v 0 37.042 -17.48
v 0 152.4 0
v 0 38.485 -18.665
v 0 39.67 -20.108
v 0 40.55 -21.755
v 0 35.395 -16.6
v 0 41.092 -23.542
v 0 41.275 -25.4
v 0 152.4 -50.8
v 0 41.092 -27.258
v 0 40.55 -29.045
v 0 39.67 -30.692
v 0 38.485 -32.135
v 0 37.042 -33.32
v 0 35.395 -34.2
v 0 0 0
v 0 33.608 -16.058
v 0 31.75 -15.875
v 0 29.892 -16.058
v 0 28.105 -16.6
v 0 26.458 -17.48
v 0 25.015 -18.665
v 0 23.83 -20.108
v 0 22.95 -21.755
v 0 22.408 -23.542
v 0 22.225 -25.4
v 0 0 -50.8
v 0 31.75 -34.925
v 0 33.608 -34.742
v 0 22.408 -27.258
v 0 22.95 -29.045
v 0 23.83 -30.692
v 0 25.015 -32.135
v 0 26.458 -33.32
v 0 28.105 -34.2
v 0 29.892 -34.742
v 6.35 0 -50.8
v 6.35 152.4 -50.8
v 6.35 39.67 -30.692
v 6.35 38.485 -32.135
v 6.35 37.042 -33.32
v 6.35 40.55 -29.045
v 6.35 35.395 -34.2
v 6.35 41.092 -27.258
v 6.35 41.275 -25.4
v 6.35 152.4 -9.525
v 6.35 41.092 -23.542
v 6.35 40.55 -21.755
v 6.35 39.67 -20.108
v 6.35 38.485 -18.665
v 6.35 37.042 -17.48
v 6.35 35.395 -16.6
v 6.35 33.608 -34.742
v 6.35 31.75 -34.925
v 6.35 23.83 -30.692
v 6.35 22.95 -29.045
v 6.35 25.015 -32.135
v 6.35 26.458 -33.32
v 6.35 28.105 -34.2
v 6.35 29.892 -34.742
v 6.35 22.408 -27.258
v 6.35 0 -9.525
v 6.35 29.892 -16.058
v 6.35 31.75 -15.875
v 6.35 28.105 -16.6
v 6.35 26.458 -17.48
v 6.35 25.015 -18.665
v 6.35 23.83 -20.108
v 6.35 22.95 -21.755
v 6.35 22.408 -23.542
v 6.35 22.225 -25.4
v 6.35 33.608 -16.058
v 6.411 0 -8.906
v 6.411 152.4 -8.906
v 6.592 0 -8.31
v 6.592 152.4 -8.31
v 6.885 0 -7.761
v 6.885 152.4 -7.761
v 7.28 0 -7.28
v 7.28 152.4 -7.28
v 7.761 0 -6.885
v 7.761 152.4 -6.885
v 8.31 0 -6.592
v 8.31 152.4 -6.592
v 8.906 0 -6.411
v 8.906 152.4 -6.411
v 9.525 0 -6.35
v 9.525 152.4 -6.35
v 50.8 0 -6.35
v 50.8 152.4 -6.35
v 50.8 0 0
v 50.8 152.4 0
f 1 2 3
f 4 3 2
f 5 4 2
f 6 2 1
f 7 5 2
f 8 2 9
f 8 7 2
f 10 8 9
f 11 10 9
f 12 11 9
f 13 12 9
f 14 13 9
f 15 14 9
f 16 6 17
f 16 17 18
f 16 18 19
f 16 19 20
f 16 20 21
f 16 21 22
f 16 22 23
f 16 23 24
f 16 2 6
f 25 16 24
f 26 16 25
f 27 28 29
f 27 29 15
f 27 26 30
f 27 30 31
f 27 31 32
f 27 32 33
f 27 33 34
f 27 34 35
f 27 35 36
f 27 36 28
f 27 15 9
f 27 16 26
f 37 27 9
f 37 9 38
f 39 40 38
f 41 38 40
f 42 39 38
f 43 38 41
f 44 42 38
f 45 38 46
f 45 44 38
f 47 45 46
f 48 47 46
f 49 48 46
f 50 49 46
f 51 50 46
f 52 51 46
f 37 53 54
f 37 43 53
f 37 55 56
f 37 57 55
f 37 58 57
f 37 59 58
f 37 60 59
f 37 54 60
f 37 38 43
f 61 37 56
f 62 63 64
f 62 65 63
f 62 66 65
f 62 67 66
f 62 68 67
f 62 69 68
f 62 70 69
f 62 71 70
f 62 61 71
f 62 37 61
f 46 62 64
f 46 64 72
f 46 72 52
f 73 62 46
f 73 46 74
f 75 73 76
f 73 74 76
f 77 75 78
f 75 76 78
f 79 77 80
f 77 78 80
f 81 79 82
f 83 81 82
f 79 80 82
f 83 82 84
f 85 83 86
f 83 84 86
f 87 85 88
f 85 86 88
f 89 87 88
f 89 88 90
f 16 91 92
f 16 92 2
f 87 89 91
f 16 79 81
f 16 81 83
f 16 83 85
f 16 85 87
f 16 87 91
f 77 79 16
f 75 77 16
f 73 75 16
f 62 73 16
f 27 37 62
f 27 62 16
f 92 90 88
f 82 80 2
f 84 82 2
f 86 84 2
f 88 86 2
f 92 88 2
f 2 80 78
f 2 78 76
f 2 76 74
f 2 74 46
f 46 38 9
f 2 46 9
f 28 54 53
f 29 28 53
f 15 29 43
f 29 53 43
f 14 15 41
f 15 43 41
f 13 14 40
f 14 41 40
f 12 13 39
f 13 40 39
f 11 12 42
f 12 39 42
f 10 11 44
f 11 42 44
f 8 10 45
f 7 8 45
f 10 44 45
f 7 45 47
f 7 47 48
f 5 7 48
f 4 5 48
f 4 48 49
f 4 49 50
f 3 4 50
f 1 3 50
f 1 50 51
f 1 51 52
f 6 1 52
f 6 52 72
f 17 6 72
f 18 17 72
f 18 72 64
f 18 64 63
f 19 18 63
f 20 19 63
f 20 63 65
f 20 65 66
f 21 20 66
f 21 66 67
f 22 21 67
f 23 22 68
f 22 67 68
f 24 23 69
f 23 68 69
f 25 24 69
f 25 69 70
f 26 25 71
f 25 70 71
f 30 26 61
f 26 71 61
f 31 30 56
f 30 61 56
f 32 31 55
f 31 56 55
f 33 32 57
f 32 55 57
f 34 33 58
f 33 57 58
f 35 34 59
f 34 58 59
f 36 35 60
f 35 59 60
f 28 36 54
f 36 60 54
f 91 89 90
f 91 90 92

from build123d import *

# Parameters (mm, degrees)
BOSS_EXTRUDE1_DEPTH             = 152.4
FILLET1_R                       = 3.175
F_3_4_0_75_DIAMETER_HOLE1_D     = 19.05
F_3_4_0_75_DIAMETER_HOLE1_DEPTH = 6.35


with BuildPart() as part:
    # Sketch1 → Boss-Extrude1 (new body)
    with BuildSketch(Plane(origin=(0, 0, 0), x_dir=(1, 0, 0), z_dir=(0, 1, 0))):
        Polygon((0, 0), (0, 50.8), (6.35, 50.8), (6.35, 6.35), (50.8, 6.35), (50.8, 0), align=None)
    extrude(amount=BOSS_EXTRUDE1_DEPTH)

    # Fillet1
    fillet1_edges = [part.edges().sort_by_distance(p)[0] for p in [
        (6.35, 76.2, -6.35),
    ]]
    fillet(fillet1_edges, radius=FILLET1_R)

    # 3/4 (0.75) Diameter Hole1
    with Locations(Plane.ZY):
        with Locations((-25.4, 31.75)):
            Hole(F_3_4_0_75_DIAMETER_HOLE1_D / 2, depth=F_3_4_0_75_DIAMETER_HOLE1_DEPTH)


solid = part.part
